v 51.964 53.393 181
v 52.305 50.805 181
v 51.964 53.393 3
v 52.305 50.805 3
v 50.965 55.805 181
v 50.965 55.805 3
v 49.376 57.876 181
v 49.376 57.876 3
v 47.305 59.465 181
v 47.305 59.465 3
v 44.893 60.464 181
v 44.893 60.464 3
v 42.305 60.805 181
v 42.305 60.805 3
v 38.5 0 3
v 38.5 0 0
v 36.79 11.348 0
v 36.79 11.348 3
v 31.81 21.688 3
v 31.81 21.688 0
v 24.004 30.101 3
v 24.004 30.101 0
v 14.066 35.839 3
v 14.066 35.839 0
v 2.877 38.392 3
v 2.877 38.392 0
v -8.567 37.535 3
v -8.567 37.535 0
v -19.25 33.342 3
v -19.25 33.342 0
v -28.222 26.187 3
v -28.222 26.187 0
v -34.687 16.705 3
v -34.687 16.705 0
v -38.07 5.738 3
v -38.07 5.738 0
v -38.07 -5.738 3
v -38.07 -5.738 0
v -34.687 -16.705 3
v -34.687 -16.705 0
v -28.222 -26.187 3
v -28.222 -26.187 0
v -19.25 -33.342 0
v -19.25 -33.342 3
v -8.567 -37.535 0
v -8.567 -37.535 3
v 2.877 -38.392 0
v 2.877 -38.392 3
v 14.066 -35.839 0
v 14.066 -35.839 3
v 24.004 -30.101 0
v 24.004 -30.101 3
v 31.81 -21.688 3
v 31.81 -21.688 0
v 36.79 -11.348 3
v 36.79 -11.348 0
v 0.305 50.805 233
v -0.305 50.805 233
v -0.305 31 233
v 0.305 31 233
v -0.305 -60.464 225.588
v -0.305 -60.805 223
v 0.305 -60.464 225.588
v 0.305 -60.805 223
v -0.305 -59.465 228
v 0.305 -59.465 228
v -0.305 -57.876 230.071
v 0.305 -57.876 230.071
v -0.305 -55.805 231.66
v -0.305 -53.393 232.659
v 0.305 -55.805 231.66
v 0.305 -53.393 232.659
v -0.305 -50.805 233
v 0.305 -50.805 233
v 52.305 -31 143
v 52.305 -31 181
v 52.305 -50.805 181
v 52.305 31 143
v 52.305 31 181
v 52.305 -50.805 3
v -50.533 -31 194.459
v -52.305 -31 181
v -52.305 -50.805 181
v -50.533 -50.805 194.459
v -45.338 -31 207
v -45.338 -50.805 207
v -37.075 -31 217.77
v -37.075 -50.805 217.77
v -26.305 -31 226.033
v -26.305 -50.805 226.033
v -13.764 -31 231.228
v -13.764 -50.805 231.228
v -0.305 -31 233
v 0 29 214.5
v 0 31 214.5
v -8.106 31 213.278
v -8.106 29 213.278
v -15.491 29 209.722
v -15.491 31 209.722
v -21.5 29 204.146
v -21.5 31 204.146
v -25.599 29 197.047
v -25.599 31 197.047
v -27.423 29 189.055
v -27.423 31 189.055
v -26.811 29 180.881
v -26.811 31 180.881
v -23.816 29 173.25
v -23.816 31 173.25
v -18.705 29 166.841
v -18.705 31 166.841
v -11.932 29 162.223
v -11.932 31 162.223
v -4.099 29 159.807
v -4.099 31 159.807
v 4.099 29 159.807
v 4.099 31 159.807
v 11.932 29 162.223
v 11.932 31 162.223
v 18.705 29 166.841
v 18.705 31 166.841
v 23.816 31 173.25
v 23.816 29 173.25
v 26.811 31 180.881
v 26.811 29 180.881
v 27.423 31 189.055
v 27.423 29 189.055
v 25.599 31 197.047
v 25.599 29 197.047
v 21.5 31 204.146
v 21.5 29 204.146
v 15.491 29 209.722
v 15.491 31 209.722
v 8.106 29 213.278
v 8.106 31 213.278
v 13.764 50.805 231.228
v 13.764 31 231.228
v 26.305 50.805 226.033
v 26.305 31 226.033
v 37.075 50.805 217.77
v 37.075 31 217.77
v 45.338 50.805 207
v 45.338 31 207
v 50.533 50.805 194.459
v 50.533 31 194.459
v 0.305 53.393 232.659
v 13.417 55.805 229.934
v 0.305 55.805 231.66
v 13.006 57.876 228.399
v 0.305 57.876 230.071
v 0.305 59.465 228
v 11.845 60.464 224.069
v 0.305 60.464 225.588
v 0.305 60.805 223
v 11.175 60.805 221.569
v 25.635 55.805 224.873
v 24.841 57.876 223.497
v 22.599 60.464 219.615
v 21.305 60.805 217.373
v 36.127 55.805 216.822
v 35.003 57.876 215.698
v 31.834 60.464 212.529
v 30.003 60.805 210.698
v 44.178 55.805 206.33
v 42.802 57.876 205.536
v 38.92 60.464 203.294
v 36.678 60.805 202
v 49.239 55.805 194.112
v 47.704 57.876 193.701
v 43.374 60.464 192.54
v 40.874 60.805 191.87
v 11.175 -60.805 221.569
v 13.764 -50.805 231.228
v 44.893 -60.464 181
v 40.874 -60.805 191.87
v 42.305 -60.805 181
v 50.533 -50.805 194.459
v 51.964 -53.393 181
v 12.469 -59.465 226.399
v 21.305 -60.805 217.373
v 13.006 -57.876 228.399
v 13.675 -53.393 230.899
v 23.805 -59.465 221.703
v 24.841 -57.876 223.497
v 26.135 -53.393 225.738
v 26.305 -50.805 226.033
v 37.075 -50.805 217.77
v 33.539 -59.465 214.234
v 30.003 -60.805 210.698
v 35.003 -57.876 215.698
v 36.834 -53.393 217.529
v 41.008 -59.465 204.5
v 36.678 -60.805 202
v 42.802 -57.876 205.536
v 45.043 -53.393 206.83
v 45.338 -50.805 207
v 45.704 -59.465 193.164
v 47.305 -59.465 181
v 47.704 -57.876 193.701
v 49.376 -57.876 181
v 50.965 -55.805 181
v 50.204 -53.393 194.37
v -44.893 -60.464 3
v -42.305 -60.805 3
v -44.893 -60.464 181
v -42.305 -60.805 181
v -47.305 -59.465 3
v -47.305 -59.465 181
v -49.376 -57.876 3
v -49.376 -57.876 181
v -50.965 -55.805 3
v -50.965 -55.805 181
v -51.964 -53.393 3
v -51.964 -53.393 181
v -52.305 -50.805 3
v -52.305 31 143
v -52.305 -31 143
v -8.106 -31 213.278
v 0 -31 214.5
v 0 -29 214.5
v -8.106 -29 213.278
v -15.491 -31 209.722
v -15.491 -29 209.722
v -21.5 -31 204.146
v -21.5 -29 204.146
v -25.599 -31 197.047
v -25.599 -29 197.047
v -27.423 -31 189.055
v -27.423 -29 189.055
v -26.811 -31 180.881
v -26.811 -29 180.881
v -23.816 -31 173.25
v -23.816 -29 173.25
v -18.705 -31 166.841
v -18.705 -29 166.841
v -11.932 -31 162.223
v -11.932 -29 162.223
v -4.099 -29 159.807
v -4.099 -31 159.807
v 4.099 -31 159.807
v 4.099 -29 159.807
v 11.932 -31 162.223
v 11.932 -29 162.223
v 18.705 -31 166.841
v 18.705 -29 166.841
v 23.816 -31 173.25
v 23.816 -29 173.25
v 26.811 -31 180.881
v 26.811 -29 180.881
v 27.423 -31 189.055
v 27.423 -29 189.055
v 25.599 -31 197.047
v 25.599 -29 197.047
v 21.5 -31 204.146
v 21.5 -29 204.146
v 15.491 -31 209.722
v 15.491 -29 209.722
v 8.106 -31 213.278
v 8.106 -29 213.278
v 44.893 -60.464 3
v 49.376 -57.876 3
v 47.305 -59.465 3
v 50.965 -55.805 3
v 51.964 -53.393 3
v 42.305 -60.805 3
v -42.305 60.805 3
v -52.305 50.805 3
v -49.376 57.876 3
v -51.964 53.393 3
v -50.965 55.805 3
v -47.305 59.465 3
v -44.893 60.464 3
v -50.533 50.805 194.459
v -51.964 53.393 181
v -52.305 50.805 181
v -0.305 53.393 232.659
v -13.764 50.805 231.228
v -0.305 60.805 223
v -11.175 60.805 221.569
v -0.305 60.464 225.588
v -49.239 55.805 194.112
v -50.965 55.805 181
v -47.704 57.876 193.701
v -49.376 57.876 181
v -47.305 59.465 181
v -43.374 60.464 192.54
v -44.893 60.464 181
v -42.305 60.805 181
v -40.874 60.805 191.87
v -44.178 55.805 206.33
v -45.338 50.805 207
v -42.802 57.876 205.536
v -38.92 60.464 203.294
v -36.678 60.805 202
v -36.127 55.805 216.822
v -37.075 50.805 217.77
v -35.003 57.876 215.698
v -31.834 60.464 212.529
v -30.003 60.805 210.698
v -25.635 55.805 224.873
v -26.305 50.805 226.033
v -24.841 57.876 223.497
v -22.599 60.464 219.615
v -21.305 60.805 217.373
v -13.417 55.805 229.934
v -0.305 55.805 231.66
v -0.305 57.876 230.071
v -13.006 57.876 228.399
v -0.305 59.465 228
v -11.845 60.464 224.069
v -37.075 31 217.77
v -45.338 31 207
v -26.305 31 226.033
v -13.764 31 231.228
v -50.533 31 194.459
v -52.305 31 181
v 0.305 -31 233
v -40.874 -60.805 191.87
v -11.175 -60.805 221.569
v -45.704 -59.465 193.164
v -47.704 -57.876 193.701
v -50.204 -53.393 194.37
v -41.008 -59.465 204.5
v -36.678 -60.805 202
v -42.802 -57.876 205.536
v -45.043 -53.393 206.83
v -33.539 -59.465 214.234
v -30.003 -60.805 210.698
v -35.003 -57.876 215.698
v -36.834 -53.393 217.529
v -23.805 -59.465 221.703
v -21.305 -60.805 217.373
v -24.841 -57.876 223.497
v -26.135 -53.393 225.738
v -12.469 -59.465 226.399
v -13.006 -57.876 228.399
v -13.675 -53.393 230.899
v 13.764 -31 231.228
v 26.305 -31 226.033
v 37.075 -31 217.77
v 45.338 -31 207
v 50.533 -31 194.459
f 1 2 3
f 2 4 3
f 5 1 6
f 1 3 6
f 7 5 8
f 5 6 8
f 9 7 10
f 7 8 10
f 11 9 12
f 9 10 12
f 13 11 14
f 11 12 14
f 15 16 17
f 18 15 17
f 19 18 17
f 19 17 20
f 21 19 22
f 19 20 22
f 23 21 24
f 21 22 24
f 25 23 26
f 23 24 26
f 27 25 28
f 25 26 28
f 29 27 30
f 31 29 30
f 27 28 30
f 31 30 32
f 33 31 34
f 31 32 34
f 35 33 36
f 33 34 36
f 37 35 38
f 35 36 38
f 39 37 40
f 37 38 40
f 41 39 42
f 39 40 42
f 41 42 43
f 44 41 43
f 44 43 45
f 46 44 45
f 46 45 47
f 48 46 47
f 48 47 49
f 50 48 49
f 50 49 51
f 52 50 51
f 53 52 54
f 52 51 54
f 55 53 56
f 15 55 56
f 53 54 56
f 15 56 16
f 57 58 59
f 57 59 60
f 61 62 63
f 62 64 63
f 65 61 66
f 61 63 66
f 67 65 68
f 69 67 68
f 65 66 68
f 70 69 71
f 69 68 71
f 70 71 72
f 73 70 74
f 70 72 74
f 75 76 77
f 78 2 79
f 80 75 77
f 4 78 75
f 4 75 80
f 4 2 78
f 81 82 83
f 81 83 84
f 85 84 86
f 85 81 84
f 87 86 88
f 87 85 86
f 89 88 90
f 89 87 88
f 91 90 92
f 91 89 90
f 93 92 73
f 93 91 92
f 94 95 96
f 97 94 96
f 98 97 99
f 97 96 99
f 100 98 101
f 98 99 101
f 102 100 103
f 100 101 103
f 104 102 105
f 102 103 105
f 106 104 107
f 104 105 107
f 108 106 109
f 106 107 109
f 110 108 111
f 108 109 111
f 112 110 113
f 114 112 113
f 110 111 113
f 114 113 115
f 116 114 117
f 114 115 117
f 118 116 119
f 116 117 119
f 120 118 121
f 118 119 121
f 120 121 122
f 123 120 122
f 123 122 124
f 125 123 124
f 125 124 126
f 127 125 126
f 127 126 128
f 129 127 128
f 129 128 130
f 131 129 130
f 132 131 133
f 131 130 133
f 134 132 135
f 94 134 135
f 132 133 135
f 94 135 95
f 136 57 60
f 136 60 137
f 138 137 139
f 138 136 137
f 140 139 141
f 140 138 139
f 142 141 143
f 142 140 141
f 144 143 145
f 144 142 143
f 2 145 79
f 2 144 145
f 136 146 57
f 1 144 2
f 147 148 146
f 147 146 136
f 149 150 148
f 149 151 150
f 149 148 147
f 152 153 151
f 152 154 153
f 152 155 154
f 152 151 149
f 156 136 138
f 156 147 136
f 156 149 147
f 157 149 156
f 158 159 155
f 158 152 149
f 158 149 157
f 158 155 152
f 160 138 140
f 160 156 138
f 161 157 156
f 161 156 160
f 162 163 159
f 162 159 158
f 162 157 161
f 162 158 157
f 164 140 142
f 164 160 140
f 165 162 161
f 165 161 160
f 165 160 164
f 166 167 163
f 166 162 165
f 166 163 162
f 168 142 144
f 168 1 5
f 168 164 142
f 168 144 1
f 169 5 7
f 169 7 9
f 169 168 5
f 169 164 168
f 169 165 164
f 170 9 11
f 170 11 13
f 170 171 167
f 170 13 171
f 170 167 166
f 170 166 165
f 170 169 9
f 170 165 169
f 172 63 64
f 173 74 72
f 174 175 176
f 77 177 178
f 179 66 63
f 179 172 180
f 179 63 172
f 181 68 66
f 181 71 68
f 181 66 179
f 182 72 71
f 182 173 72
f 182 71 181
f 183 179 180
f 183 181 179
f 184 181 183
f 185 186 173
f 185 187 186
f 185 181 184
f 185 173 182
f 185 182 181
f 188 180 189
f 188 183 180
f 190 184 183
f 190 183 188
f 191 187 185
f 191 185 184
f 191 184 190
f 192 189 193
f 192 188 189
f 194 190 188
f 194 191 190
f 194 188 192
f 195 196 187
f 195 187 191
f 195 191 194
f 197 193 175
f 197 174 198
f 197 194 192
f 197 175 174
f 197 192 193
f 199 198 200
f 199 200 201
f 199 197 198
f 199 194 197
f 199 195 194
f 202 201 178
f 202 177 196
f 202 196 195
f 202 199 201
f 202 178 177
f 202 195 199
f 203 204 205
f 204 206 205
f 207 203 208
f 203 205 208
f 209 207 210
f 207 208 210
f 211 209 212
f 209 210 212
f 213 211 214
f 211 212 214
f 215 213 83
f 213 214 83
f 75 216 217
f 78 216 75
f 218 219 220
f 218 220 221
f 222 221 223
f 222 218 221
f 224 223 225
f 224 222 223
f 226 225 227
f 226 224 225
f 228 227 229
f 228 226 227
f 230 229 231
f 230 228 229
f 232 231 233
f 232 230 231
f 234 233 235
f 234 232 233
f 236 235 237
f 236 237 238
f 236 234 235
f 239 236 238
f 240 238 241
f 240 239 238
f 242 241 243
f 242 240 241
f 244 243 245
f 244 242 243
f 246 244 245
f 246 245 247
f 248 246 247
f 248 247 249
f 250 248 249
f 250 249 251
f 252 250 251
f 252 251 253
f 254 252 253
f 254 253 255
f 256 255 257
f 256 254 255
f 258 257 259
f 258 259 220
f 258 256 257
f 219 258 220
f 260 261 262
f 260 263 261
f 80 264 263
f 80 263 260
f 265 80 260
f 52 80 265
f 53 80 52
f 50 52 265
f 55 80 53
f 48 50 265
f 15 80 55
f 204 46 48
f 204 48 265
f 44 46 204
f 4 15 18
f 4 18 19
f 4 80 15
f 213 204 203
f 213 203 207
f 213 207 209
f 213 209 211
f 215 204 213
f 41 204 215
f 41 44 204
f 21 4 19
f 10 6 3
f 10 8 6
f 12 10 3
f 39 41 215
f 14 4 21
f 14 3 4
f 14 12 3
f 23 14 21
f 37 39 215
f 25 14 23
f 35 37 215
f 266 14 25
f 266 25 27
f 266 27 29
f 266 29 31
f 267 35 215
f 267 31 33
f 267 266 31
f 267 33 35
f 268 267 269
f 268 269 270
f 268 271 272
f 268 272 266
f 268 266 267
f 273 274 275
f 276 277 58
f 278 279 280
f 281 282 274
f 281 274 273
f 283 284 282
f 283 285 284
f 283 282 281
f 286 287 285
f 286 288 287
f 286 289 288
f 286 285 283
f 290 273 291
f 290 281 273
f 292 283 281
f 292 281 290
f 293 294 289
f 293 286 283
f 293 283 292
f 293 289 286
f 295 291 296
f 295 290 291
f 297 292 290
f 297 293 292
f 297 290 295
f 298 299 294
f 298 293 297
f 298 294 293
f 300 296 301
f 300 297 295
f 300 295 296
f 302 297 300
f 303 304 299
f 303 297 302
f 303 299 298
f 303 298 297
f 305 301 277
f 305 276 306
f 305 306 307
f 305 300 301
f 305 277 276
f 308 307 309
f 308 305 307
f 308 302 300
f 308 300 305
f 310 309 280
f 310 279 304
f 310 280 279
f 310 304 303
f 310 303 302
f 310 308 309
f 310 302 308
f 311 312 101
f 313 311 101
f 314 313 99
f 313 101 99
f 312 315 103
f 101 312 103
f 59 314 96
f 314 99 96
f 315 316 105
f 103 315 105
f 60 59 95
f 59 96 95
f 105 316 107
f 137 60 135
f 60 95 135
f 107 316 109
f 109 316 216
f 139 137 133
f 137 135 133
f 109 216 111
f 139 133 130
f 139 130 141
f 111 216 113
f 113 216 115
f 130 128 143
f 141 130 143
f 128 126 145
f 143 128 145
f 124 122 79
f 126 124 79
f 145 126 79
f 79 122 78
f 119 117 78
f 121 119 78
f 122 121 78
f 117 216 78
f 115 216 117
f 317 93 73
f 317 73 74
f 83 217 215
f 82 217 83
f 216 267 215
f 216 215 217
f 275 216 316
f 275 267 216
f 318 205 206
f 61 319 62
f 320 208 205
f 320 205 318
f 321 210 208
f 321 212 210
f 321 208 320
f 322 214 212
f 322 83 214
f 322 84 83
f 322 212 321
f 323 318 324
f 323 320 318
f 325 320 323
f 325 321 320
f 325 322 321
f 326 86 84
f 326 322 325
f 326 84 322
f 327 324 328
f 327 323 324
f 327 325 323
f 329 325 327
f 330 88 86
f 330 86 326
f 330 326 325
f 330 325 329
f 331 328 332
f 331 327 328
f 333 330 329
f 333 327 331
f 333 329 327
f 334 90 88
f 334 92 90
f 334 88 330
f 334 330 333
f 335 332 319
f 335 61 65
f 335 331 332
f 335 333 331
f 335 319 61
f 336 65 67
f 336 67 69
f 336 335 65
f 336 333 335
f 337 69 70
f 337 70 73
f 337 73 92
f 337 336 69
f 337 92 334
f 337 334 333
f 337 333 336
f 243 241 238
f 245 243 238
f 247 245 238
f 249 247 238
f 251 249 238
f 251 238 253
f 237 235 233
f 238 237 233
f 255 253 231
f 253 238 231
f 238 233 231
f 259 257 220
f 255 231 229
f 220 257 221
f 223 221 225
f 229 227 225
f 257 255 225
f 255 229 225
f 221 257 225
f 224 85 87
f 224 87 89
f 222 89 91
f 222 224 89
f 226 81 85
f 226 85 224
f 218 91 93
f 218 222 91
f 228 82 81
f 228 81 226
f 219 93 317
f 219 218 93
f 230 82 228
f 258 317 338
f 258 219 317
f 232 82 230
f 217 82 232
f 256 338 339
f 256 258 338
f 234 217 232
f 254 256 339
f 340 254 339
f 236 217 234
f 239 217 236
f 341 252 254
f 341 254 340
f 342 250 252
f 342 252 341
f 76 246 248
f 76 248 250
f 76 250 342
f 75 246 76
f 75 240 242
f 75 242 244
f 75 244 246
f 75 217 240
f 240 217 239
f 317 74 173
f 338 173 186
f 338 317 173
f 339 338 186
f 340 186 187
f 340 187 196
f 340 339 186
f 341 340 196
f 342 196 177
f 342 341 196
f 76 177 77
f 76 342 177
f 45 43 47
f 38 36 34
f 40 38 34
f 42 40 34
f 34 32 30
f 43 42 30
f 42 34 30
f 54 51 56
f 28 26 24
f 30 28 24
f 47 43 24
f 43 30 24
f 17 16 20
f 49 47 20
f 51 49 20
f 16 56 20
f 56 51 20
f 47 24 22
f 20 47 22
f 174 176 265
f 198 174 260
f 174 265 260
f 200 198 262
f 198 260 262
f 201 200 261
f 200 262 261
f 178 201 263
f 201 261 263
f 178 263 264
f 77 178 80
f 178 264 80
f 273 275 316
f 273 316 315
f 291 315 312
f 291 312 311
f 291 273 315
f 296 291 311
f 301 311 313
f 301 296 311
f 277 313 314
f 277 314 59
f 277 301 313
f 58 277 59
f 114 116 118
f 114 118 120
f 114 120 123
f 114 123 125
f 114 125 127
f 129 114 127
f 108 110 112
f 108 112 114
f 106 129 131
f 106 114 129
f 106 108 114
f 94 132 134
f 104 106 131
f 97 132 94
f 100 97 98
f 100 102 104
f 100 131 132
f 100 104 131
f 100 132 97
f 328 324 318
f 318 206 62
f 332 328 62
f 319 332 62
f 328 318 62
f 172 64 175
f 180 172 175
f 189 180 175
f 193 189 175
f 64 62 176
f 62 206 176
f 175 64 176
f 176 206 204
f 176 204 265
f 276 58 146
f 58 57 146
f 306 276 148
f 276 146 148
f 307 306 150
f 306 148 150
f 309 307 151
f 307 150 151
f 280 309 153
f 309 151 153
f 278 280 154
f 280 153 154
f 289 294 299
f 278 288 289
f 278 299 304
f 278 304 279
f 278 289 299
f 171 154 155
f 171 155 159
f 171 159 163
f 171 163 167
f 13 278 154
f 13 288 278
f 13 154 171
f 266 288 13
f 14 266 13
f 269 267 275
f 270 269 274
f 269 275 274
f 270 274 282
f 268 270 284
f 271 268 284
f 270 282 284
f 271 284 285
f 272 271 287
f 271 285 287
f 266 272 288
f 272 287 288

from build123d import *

# Parameters (mm, degrees)
SCHIZZO4_R           = 38.5
CORPOCONTATTO_DEPTH  = 3
CORPOROTANTE_DEPTH   = 60.805
RACCORDO_R           = 10
SCHIZZO6_W           = 104.61
SCHIZZO6_H           = 90
TAGLIOCENTRALE_DEPTH = 31
SCHIZZO7_R           = 27.5
CONTATTO_DEPTH       = 2


with BuildPart() as part:
    # Schizzo4 → CorpoContatto (new body)
    with BuildSketch(Plane.XY):
        Circle(SCHIZZO4_R)
    extrude(amount=CORPOCONTATTO_DEPTH)

    # Schizzo5 → CorpoRotante (add, symmetric)
    with BuildSketch(Plane(origin=(0, 0, 0), x_dir=(1, 0, 0), z_dir=(0, 1, 0))):
        with BuildLine():
            Line((52.305, -3), (-52.305, -3))
            Line((-52.305, -3), (-52.305, -181))
            ThreePointArc((-52.305, -181), (-37.074552622, -217.769552622), (-0.305, -233))
            Line((-0.305, -233), (0.305, -233))
            ThreePointArc((0.305, -233), (37.074552622, -217.769552622), (52.305, -181))
            Line((52.305, -181), (52.305, -3))
        make_face()
    extrude(amount=CORPOROTANTE_DEPTH, both=True)

    # Raccordo
    raccordo_edges = [part.edges().sort_by_distance(p)[0] for p in [
        (52.305, -60.805, 92),
        (-52.305, -60.805, 92),
        (-37.074552622, -60.805, 217.769552622),
        (0, -60.805, 233),
        (37.074552622, -60.805, 217.769552622),
        (52.305, 60.805, 92),
        (-52.305, 60.805, 92),
        (-37.074552622, 60.805, 217.769552622),
        (0, 60.805, 233),
        (37.074552622, 60.805, 217.769552622),
    ]]
    fillet(raccordo_edges, radius=RACCORDO_R)

    # Schizzo6 → TaglioCentrale (cut, symmetric)
    with BuildSketch(Plane(origin=(0, 0, 0), x_dir=(1, 0, 0), z_dir=(0, 1, 0))):
        with Locations((0, -188)):
            Rectangle(SCHIZZO6_W, SCHIZZO6_H)
    extrude(amount=TAGLIOCENTRALE_DEPTH, both=True, mode=Mode.SUBTRACT)

    # Schizzo7 → Contatto (add)
    with BuildSketch(Plane.XZ.offset(-31)):
        with Locations(Location((0, 187, 0), (0, 0, 90))):
            Circle(SCHIZZO7_R)
    contatto = extrude(amount=CONTATTO_DEPTH)

    # Specchia1: Contatto across plane
    add(contatto.mirror(Plane.ZX))


solid = part.part
